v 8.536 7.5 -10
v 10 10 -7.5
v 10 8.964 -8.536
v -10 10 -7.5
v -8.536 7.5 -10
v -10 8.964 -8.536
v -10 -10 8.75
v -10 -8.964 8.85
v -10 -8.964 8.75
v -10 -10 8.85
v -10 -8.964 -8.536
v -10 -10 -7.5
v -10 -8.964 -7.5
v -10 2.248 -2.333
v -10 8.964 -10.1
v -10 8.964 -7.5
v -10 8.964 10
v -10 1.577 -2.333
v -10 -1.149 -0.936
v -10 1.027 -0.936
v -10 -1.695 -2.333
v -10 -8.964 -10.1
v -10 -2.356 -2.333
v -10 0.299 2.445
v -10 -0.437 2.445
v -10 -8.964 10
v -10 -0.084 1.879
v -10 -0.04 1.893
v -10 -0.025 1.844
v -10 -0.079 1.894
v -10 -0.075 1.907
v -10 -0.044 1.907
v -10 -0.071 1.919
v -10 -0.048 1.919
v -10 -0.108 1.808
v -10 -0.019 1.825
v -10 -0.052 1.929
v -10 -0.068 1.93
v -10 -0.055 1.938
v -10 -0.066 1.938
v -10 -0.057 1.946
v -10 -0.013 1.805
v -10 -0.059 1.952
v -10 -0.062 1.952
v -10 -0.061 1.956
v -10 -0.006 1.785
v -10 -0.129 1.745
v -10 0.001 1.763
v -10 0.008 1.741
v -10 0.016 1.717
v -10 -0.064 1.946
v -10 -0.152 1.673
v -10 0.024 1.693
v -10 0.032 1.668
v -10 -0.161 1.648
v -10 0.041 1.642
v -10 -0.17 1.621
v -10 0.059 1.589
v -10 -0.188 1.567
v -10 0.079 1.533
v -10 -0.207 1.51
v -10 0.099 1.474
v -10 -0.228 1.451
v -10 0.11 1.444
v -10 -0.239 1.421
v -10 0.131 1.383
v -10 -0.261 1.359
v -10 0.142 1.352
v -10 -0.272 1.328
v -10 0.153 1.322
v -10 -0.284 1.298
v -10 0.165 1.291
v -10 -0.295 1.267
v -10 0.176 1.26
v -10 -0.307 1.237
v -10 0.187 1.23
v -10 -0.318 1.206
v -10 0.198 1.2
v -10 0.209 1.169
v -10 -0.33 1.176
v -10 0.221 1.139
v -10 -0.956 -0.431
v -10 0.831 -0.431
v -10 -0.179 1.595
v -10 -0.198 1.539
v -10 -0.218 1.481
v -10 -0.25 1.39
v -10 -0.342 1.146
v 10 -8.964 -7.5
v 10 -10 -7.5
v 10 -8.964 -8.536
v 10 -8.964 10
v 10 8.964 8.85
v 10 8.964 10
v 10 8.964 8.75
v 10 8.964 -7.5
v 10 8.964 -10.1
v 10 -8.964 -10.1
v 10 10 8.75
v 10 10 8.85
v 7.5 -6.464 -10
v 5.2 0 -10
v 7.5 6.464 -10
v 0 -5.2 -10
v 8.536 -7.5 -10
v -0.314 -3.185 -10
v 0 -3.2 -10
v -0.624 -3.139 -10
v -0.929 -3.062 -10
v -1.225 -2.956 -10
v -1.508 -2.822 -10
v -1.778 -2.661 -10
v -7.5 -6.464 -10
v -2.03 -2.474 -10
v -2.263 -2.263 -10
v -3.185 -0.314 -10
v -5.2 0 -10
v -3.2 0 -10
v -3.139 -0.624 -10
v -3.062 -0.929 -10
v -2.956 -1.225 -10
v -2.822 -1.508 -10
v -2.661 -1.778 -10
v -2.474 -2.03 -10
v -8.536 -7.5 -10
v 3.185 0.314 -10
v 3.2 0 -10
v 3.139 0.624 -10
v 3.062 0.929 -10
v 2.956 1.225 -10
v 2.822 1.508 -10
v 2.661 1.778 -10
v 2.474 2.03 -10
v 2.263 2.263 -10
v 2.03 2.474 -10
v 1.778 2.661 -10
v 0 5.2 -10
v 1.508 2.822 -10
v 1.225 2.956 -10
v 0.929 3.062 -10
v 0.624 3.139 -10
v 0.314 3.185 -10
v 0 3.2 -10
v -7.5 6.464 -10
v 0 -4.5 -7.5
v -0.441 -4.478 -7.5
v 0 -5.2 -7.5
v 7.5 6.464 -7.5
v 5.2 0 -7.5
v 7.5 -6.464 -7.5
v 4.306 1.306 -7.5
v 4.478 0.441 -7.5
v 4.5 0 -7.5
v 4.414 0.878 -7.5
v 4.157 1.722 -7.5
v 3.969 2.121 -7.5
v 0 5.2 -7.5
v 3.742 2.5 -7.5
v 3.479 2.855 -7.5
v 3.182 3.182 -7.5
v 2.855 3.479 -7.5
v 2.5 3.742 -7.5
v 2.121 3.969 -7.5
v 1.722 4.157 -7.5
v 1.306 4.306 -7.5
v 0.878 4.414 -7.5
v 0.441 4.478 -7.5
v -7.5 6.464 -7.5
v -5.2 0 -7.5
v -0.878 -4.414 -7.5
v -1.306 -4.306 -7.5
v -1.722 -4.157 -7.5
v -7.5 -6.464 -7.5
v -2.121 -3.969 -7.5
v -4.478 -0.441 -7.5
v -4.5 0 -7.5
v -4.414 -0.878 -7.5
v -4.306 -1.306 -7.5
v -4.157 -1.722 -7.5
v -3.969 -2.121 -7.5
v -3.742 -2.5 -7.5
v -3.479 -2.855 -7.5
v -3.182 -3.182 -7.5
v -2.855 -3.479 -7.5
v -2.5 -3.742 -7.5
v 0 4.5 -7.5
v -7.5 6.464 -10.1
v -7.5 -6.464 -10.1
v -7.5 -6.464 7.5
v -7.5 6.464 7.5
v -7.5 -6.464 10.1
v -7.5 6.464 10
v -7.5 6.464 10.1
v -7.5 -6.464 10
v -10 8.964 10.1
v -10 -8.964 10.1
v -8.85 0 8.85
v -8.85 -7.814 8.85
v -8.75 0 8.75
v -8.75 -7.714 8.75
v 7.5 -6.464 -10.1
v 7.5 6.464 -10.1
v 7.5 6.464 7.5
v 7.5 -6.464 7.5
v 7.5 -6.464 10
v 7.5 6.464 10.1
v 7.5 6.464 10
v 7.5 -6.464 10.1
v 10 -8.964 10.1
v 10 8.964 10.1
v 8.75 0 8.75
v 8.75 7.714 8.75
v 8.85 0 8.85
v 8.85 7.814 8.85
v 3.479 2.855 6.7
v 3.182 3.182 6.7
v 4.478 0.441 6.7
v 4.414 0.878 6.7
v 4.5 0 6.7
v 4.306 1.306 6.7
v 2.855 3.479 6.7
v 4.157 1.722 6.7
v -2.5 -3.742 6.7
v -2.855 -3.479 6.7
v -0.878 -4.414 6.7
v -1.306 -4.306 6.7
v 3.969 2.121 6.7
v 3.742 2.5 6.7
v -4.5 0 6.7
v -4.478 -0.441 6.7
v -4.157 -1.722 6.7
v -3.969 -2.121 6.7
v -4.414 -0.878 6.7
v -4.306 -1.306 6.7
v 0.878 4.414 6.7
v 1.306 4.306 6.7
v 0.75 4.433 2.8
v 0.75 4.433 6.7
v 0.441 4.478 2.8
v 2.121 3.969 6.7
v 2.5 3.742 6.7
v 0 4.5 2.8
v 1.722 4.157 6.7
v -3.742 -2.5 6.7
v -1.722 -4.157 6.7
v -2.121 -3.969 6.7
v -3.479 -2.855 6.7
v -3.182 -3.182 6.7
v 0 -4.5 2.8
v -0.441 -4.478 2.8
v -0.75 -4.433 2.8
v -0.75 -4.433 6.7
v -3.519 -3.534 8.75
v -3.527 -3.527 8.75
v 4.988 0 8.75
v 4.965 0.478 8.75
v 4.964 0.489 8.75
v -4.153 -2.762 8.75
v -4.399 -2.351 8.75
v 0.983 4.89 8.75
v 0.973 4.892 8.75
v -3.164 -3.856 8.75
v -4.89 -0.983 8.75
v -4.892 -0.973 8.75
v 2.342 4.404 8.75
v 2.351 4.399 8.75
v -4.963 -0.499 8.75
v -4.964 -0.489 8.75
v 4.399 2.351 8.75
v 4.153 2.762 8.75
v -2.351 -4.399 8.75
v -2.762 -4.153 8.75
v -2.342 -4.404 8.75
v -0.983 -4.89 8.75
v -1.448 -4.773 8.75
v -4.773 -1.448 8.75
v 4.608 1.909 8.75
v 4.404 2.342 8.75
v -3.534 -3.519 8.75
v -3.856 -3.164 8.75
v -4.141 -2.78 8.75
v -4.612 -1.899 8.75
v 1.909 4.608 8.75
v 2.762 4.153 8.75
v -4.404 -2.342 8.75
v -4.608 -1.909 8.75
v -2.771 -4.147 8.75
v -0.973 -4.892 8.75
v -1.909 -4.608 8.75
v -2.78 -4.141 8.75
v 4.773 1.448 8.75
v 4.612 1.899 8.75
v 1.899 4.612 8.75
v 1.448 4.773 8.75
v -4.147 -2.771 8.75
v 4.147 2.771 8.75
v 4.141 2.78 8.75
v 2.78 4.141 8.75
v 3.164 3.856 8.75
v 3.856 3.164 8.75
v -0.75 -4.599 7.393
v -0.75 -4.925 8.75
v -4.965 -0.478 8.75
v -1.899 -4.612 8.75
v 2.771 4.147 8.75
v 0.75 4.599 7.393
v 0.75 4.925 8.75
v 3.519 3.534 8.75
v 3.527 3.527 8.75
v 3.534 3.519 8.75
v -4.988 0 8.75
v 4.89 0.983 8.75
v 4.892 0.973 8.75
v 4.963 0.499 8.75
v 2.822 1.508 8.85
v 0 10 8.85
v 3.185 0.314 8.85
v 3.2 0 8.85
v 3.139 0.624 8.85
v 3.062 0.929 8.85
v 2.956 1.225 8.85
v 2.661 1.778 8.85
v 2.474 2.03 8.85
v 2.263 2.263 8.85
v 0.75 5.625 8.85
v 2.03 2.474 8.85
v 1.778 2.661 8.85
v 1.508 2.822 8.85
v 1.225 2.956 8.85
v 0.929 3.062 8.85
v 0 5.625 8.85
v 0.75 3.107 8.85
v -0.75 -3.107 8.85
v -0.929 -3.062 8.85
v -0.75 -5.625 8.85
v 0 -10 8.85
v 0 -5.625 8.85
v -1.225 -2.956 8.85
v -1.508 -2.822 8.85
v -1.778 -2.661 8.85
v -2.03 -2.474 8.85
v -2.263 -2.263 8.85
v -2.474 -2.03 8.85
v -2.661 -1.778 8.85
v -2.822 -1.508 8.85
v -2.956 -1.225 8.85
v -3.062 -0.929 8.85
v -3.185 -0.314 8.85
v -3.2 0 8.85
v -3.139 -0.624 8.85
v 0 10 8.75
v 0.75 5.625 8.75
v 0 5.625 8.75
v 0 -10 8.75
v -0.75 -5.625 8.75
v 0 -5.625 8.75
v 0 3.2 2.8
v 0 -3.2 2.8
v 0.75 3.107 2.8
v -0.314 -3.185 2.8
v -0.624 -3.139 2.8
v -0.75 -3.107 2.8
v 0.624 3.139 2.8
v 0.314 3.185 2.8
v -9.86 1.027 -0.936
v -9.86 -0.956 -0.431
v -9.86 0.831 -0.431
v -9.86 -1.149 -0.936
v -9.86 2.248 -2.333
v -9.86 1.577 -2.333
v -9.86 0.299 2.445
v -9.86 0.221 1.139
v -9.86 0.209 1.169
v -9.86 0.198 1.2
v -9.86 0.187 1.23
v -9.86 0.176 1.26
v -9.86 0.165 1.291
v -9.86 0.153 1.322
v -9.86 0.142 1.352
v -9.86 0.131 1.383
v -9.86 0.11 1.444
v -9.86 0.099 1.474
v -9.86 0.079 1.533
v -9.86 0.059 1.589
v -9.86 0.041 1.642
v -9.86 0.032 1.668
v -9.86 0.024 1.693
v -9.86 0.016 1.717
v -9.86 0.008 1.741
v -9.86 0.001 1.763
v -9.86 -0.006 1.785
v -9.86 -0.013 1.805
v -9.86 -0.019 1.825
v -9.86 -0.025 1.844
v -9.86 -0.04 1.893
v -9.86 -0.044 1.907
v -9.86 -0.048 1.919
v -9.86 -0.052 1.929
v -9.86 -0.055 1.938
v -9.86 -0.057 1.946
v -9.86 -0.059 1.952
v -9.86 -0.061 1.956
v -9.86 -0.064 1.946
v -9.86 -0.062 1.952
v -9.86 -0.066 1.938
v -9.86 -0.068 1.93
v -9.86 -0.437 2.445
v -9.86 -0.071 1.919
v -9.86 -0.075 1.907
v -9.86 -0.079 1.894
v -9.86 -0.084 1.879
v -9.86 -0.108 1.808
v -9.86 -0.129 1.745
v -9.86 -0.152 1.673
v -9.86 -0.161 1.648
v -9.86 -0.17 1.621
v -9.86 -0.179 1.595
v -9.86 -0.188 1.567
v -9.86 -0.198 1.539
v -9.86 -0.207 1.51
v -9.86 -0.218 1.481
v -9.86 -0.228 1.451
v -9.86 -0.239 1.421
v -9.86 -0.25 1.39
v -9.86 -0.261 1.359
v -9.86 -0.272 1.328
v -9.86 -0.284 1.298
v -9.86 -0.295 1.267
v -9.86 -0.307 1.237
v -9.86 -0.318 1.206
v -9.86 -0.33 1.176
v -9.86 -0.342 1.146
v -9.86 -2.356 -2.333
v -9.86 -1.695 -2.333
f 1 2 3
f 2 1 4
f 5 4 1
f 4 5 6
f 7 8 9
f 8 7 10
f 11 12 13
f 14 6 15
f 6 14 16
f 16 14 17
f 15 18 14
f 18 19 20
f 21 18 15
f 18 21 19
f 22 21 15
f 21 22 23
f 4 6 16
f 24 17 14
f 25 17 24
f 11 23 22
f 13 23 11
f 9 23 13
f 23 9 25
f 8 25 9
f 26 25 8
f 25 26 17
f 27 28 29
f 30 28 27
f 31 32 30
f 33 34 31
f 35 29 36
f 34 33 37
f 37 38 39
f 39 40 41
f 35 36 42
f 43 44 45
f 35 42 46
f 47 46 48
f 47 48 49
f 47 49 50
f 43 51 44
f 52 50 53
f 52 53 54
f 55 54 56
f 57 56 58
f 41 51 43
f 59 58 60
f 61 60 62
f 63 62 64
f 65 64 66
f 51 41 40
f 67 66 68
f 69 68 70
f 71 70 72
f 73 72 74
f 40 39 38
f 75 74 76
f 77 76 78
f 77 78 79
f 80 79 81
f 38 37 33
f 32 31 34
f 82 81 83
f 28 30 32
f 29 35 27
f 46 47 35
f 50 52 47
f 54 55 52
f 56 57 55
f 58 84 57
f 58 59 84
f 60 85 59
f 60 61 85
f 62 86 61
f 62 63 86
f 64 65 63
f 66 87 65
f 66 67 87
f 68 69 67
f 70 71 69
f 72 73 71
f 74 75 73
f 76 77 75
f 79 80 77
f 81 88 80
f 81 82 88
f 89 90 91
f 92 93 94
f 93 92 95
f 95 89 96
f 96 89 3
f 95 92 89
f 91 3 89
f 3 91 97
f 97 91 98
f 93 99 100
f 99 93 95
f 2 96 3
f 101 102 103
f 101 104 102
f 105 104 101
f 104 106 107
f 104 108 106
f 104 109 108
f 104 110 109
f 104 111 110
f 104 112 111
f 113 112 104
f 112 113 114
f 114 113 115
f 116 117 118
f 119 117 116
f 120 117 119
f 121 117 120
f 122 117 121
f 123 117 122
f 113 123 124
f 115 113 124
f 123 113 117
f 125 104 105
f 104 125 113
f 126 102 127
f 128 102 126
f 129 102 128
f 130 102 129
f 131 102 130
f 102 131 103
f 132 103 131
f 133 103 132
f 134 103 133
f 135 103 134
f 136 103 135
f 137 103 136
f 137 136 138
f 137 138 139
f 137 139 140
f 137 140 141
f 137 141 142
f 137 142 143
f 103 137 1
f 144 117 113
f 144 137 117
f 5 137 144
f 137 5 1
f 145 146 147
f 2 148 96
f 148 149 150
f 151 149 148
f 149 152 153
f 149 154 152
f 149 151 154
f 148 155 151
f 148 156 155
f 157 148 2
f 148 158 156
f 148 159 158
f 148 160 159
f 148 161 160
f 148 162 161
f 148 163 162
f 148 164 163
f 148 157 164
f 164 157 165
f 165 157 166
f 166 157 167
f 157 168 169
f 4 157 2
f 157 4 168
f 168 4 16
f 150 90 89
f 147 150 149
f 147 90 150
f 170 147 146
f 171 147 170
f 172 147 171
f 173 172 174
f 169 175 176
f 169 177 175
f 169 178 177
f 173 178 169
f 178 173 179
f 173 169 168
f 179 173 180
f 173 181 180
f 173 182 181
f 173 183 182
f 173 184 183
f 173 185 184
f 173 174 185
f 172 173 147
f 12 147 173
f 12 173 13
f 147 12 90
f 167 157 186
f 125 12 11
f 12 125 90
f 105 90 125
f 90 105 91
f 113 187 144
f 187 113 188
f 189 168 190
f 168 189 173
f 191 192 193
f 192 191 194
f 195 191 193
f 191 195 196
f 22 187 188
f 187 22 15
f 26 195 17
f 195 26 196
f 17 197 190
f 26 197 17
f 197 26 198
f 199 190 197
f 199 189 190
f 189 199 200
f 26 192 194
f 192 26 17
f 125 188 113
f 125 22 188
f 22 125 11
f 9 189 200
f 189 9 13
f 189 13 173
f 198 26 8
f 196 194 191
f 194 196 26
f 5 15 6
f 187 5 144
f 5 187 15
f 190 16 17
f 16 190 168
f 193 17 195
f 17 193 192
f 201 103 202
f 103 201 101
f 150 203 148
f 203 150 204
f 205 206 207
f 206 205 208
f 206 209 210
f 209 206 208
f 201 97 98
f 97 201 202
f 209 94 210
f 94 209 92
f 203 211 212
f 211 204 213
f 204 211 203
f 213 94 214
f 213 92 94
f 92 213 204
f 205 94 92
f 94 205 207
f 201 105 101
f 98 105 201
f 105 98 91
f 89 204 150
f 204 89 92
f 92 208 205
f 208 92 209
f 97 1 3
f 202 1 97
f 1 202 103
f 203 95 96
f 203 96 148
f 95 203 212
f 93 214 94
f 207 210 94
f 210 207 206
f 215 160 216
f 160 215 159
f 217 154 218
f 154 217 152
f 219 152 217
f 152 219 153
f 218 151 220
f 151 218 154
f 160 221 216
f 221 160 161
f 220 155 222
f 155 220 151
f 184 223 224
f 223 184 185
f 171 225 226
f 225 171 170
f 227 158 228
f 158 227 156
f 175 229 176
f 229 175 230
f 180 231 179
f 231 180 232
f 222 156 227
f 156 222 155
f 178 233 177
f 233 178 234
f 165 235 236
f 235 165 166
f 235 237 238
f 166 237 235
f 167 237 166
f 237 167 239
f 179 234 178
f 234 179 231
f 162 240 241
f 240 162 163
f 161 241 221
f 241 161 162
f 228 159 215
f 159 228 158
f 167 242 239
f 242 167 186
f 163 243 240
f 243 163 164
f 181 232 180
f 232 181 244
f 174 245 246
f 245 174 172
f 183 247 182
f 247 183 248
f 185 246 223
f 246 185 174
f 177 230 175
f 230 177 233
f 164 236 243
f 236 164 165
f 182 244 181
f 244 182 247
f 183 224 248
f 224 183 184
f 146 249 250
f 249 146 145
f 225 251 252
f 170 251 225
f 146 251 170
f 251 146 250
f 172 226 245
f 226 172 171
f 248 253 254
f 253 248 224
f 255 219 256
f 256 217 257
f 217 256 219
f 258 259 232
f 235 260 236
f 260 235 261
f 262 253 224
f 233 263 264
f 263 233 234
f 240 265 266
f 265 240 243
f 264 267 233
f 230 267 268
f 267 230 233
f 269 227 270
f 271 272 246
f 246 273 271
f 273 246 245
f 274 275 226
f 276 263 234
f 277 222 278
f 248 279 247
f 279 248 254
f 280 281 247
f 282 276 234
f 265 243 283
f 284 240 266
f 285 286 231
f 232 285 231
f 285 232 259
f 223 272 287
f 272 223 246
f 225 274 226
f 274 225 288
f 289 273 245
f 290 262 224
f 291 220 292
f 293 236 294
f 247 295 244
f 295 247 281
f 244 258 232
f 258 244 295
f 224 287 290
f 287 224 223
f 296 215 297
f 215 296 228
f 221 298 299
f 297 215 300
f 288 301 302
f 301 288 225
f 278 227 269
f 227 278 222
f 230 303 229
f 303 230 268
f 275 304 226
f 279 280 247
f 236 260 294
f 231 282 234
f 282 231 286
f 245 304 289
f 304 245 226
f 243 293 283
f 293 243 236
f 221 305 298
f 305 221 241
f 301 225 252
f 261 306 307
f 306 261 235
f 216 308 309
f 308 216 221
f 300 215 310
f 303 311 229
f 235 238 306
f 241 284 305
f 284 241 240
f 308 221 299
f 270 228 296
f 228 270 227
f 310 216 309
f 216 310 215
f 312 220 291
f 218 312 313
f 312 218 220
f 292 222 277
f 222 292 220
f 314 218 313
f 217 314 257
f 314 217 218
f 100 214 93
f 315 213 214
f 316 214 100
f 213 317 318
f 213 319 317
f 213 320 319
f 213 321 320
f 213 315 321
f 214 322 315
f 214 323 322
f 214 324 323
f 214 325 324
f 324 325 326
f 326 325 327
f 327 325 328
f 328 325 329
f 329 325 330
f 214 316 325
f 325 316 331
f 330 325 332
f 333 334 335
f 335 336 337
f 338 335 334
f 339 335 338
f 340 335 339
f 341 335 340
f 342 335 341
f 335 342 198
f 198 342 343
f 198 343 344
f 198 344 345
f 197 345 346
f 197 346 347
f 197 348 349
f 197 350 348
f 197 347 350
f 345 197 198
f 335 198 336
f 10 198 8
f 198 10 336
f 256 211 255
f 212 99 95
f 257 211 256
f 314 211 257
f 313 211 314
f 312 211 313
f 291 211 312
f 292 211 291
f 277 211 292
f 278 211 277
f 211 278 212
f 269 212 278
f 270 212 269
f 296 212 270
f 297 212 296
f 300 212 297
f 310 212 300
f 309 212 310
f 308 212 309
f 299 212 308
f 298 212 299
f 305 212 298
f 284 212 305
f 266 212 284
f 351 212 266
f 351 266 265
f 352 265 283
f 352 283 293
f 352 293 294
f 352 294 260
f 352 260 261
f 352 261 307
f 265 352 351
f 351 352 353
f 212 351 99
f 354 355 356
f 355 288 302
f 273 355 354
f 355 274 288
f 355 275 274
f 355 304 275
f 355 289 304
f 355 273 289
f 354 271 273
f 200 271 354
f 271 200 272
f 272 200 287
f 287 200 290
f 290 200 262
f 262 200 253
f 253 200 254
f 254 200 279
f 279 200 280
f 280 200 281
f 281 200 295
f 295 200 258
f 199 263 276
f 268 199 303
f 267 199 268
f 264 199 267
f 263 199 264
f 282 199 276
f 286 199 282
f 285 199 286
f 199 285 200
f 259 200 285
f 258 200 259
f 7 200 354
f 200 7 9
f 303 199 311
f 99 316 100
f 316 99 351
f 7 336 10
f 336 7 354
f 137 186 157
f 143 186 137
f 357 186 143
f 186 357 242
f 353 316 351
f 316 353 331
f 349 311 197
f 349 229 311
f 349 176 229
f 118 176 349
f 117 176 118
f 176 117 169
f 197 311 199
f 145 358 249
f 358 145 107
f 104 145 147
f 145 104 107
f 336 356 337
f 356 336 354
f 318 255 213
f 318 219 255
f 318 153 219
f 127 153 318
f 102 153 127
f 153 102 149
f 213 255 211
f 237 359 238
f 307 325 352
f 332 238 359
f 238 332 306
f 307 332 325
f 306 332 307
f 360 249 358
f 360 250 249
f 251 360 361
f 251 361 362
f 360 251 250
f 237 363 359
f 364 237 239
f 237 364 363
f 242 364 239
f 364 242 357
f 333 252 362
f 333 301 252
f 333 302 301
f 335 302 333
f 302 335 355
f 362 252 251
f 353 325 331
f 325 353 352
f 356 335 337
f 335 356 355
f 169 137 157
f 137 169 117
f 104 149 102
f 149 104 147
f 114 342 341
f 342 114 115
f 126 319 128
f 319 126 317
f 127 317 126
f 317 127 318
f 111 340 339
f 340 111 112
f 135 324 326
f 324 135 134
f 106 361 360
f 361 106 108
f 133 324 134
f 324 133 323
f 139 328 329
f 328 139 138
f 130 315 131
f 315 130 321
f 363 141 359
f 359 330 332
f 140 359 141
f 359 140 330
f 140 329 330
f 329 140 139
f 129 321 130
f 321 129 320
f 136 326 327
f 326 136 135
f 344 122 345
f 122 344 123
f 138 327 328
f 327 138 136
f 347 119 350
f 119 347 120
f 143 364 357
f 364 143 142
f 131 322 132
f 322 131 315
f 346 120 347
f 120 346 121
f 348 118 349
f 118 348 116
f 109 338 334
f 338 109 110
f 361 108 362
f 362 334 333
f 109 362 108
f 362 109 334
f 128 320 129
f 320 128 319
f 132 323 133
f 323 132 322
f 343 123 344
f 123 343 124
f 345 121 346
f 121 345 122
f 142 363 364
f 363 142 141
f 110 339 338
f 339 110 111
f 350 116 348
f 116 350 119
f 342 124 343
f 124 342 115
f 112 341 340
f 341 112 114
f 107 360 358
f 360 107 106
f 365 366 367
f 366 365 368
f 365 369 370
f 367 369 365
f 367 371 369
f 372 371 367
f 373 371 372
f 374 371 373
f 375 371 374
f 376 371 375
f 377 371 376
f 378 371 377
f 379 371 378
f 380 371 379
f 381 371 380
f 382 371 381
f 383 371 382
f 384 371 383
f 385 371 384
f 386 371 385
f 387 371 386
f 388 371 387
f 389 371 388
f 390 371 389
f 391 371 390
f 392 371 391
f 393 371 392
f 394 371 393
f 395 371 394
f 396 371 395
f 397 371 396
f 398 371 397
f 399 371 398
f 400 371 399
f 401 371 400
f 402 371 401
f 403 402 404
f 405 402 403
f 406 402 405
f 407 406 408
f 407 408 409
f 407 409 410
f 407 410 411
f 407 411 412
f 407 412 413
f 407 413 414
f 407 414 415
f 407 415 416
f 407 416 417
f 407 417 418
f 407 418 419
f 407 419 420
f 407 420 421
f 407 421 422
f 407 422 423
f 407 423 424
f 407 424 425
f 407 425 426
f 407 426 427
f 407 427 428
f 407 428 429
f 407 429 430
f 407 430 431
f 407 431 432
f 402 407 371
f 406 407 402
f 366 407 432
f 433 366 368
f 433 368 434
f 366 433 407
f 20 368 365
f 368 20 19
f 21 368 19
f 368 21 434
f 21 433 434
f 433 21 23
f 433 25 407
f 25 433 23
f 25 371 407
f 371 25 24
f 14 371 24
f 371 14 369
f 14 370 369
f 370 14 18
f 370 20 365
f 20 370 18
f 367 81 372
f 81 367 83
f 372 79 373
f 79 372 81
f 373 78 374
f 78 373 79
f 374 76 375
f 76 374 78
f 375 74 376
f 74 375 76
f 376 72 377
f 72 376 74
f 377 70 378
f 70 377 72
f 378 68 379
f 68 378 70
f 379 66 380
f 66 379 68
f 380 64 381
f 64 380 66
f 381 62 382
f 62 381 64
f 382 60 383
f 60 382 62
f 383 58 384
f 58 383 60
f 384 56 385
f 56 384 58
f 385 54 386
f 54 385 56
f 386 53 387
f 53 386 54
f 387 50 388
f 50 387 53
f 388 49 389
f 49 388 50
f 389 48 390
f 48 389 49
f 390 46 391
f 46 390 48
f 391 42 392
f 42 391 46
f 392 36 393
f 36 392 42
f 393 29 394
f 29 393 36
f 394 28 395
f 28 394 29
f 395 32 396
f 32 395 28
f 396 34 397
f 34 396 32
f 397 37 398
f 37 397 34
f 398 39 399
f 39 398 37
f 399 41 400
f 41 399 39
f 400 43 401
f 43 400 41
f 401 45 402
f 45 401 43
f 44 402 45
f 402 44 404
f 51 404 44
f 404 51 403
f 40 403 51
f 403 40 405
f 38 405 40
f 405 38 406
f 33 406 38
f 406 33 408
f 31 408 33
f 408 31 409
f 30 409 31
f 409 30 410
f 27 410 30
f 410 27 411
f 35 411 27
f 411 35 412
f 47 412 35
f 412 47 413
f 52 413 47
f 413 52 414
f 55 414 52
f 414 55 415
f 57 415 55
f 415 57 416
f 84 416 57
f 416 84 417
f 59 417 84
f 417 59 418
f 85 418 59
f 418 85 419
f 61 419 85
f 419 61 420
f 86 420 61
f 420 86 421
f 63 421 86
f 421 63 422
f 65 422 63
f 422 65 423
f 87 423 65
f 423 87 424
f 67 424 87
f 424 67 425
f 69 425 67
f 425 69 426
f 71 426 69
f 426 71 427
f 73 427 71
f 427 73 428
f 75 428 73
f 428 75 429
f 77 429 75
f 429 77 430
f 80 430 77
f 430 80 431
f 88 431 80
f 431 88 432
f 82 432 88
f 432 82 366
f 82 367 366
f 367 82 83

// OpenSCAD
// 20mm Half-Cube (Additive Primitives)
// Units: mm

$fn = 64;

// --- Parameters ---
size = 20.0;
thick = 2.5;
rod_D = 6.0;
clearance = 0.2; // Rod/Miter clearance
snap_h = 2.0;
fit_clear = 0.1; // Miter fit clearance (physical gap)

// Derived
cyl_H = size - 2*thick - fit_clear; // Reduce height for clearance
cyl_R = 4.5; // 9mm diam

// --- Toggles ---
show_base = true;
show_walls = true;
show_mech = true;

// --- Assembly ---
module assembly() {
    difference() {
        union() {
            // Base: Move to Bottom (Z = -size/2 + thick/2)
            if (show_base) 
                color("cyan") 
                translate([0, 0, -size/2 + thick/2]) 
                base_plate();
                
            if (show_walls) color("lime") translate([-size/2 + thick/2, 0, 0]) mitered_wall_left();
            if (show_walls) color("lime") translate([size/2 - thick/2, 0, 0]) mitered_wall_right();
            
            // Mechanism (Rooted in base)
            if (show_mech)
                translate([0,0, -size/2 + thick - 0.6]) // Overlap slightly more to be safe
                    mechanism();
             
            // Welds (Force Union of touching primitives)
            // Only show welds if we have the parts they connect
            if (show_base && show_walls) color("red") welds();
        }
        
        // --- Global Bores ---
        // Rod Hole
        cylinder(r=rod_D/2 + clearance, h=size*3, center=true);
        
        // Catch Grooves (rotated 90 deg)
        // Cut INTO the base (Z- direction from top of base)
        // Base Top is at -size/2 + thick.
        // Grooves are height snap_h+0.5.
        // We want them to end at Base Top.
        translate([0, 0, -size/2 + thick - (snap_h+0.5)])
            rotate([0,0,90]) 
            catch_grooves();
            
        // Text
        emboss_text();
    }
}

// --- Primitives ---

module base_plate() {
    difference() {
        // Original solid
         rotate([0, 90, 0])
            linear_extrude(height=size, center=true)
                polygon(points=[
                    [-thick/2, -size/2],         // Top-Left (Wide - Z-pos)
                    [thick/2, -size/2 + thick],  // Bottom-Left (Narrow - Z-neg)
                    [thick/2, size/2 - thick],   // Bottom-Right (Narrow)
                    [-thick/2, size/2]           // Top-Right (Wide)
                ]);
         
         // Clearance Cuts for Base
         // Cut the Y-faces.
         // Plane at 45 deg.
         // Use the same logic as Wall?
         // Wall cuts corner. Base IS the corner.
         // We want to shave the angled face.
         // Angled face normal (0, -1, -1). 
         // Move cutter "In".
         
         // Front
         translate([0, -size/2, -size/2 + thick]) // Tip of 45 face
            rotate([45, 0, 0]) 
            translate([0, 0, -fit_clear]) // Shift cutter 'down' (local Z)
            cube([size*2, thick*3, thick], center=true); // Flat Plate Cutter
            
         // Back
         translate([0, size/2, -size/2 + thick]) 
            rotate([-45, 0, 0]) 
            translate([0, 0, -fit_clear])
            cube([size*2, thick*3, thick], center=true);
    }
}

module mitered_wall_left() {
    intersection() {
        cube([thick, size, size*1.5], center=true); // Increase Z height to prevent clipping
        block_with_chamfers();
    }
}

module mitered_wall_right() {
    mirror([1,0,0]) mitered_wall_left();
}

module block_with_chamfers() {
    difference() {
        // Extend height slightly to force overlap with Base at bottom
        cube([thick, size, size + 0.2], center=true); 
        
         
         // Fix: Move it so its 'Bottom-Left' edge (after rotation) touches the cut line.
         // Easier: Use the polygon approach for precision.
         
         translate([thick/2, 0, size/2]) // At Top-Inner corner
             rotate([90, 0, 0])
             linear_extrude(size*2, center=true)
             polygon([[0,0], [-thick, 0], [0, -thick]]); // Triangle in XZ plane (-X, -Z)
             // This removes the corner exactly.
             
        /* 
        translate([thick/2, 0, size/2])
            rotate([0, -45, 0])
            cube([thick*2, size*2, thick*2], center=true);
        */
            
         // Front Chamfer (Y-)
         translate([thick/2, -size/2, 0])
            rotate([0, 0, 45])
            cube([thick*2, thick*2, size*2], center=true);
            
         // Back Chamfer (Y+)
         translate([thick/2, size/2, 0])
            rotate([0, 0, -45])
            cube([thick*2, thick*2, size*2], center=true);
    }
}

module mechanism() {
    difference() {
        union() {
            // 1. Shaft Solid
            cylinder(r=cyl_R, h=cyl_H); 
            
            // 2. Snaps Solid (Sink into Shaft)
            translate([0,0, cyl_H - 0.1])
                 cylinder(r1=cyl_R, r2=cyl_R + 0.5, h=snap_h + 0.1);
                 
            // 3. Flat Top
             translate([0,0, cyl_H + snap_h]) 
                cube([20,20,0.1], center=true);
        }
        
        // --- Subtractions ---
        
        // 1. Inactive Sectors
        rotate([0,0,90]) wedge_cut();
        rotate([0,0,270]) wedge_cut();
        
        // 2. Relief Slot (The Fix)
        // Cut through Snaps AND Shaft top
        // Reduce width to 1.5 to avoid sliver creation?
        translate([0,0, cyl_H])
            cube([1.5, cyl_R*2.5, snap_h*4], center=true); 
    }
}

// Snaps module is now integrated into mechanism
module snaps() {
    // Deprecated
}

module catch_grooves() {
    rotate([0,0,0]) wedge_cut(h=snap_h+0.5, r=cyl_R + 0.5 + 0.2);
    rotate([0,0,180]) wedge_cut(h=snap_h+0.5, r=cyl_R + 0.5 + 0.2);
}

module wedge_cut(h=size, r=20) {
    linear_extrude(h) polygon([[0,0], [r,0], [0,r]]); 
}

module welds() {
    // Small cubes to bridge gaps at the internal connection points
    // 1. Left Wall to Base
    translate([-size/2 + thick/2, 0, -size/2 + thick/2]) // Center of Wall/Base overlap
        cube([thick/2, size/2, thick/2], center=true); 
        
    // 2. Right Wall to Base
    translate([size/2 - thick/2, 0, -size/2 + thick/2]) 
        cube([thick/2, size/2, thick/2], center=true);
        
    // 3. Mechanism to Base
    // Base is now explicitly at bottom.
    // Mechanism root is at -size/2 + thick.
    // Weld at -size/2 + thick/2?
    translate([0, 0, -size/2 + thick/2]) 
        cube([2, 2, 2], center=true);
}

module emboss_text() {
     translate([-size/2 + 0.3/2 -0.01, 0, 0])
     rotate([90,0,270])
     linear_extrude(0.4)
     text("A", size=5, valign="center", halign="center");
}


// --- Main Render ---
if (!is_undef(run_demo)) {
    assembly();
}

// Fallback for direct execution in GUI (OpenSCAD defines nothing by default?)
// Actually, usually we check 'is_undef(run_demo) && is_undef(is_library)'
if (is_undef(is_library)) {
    assembly();
}
